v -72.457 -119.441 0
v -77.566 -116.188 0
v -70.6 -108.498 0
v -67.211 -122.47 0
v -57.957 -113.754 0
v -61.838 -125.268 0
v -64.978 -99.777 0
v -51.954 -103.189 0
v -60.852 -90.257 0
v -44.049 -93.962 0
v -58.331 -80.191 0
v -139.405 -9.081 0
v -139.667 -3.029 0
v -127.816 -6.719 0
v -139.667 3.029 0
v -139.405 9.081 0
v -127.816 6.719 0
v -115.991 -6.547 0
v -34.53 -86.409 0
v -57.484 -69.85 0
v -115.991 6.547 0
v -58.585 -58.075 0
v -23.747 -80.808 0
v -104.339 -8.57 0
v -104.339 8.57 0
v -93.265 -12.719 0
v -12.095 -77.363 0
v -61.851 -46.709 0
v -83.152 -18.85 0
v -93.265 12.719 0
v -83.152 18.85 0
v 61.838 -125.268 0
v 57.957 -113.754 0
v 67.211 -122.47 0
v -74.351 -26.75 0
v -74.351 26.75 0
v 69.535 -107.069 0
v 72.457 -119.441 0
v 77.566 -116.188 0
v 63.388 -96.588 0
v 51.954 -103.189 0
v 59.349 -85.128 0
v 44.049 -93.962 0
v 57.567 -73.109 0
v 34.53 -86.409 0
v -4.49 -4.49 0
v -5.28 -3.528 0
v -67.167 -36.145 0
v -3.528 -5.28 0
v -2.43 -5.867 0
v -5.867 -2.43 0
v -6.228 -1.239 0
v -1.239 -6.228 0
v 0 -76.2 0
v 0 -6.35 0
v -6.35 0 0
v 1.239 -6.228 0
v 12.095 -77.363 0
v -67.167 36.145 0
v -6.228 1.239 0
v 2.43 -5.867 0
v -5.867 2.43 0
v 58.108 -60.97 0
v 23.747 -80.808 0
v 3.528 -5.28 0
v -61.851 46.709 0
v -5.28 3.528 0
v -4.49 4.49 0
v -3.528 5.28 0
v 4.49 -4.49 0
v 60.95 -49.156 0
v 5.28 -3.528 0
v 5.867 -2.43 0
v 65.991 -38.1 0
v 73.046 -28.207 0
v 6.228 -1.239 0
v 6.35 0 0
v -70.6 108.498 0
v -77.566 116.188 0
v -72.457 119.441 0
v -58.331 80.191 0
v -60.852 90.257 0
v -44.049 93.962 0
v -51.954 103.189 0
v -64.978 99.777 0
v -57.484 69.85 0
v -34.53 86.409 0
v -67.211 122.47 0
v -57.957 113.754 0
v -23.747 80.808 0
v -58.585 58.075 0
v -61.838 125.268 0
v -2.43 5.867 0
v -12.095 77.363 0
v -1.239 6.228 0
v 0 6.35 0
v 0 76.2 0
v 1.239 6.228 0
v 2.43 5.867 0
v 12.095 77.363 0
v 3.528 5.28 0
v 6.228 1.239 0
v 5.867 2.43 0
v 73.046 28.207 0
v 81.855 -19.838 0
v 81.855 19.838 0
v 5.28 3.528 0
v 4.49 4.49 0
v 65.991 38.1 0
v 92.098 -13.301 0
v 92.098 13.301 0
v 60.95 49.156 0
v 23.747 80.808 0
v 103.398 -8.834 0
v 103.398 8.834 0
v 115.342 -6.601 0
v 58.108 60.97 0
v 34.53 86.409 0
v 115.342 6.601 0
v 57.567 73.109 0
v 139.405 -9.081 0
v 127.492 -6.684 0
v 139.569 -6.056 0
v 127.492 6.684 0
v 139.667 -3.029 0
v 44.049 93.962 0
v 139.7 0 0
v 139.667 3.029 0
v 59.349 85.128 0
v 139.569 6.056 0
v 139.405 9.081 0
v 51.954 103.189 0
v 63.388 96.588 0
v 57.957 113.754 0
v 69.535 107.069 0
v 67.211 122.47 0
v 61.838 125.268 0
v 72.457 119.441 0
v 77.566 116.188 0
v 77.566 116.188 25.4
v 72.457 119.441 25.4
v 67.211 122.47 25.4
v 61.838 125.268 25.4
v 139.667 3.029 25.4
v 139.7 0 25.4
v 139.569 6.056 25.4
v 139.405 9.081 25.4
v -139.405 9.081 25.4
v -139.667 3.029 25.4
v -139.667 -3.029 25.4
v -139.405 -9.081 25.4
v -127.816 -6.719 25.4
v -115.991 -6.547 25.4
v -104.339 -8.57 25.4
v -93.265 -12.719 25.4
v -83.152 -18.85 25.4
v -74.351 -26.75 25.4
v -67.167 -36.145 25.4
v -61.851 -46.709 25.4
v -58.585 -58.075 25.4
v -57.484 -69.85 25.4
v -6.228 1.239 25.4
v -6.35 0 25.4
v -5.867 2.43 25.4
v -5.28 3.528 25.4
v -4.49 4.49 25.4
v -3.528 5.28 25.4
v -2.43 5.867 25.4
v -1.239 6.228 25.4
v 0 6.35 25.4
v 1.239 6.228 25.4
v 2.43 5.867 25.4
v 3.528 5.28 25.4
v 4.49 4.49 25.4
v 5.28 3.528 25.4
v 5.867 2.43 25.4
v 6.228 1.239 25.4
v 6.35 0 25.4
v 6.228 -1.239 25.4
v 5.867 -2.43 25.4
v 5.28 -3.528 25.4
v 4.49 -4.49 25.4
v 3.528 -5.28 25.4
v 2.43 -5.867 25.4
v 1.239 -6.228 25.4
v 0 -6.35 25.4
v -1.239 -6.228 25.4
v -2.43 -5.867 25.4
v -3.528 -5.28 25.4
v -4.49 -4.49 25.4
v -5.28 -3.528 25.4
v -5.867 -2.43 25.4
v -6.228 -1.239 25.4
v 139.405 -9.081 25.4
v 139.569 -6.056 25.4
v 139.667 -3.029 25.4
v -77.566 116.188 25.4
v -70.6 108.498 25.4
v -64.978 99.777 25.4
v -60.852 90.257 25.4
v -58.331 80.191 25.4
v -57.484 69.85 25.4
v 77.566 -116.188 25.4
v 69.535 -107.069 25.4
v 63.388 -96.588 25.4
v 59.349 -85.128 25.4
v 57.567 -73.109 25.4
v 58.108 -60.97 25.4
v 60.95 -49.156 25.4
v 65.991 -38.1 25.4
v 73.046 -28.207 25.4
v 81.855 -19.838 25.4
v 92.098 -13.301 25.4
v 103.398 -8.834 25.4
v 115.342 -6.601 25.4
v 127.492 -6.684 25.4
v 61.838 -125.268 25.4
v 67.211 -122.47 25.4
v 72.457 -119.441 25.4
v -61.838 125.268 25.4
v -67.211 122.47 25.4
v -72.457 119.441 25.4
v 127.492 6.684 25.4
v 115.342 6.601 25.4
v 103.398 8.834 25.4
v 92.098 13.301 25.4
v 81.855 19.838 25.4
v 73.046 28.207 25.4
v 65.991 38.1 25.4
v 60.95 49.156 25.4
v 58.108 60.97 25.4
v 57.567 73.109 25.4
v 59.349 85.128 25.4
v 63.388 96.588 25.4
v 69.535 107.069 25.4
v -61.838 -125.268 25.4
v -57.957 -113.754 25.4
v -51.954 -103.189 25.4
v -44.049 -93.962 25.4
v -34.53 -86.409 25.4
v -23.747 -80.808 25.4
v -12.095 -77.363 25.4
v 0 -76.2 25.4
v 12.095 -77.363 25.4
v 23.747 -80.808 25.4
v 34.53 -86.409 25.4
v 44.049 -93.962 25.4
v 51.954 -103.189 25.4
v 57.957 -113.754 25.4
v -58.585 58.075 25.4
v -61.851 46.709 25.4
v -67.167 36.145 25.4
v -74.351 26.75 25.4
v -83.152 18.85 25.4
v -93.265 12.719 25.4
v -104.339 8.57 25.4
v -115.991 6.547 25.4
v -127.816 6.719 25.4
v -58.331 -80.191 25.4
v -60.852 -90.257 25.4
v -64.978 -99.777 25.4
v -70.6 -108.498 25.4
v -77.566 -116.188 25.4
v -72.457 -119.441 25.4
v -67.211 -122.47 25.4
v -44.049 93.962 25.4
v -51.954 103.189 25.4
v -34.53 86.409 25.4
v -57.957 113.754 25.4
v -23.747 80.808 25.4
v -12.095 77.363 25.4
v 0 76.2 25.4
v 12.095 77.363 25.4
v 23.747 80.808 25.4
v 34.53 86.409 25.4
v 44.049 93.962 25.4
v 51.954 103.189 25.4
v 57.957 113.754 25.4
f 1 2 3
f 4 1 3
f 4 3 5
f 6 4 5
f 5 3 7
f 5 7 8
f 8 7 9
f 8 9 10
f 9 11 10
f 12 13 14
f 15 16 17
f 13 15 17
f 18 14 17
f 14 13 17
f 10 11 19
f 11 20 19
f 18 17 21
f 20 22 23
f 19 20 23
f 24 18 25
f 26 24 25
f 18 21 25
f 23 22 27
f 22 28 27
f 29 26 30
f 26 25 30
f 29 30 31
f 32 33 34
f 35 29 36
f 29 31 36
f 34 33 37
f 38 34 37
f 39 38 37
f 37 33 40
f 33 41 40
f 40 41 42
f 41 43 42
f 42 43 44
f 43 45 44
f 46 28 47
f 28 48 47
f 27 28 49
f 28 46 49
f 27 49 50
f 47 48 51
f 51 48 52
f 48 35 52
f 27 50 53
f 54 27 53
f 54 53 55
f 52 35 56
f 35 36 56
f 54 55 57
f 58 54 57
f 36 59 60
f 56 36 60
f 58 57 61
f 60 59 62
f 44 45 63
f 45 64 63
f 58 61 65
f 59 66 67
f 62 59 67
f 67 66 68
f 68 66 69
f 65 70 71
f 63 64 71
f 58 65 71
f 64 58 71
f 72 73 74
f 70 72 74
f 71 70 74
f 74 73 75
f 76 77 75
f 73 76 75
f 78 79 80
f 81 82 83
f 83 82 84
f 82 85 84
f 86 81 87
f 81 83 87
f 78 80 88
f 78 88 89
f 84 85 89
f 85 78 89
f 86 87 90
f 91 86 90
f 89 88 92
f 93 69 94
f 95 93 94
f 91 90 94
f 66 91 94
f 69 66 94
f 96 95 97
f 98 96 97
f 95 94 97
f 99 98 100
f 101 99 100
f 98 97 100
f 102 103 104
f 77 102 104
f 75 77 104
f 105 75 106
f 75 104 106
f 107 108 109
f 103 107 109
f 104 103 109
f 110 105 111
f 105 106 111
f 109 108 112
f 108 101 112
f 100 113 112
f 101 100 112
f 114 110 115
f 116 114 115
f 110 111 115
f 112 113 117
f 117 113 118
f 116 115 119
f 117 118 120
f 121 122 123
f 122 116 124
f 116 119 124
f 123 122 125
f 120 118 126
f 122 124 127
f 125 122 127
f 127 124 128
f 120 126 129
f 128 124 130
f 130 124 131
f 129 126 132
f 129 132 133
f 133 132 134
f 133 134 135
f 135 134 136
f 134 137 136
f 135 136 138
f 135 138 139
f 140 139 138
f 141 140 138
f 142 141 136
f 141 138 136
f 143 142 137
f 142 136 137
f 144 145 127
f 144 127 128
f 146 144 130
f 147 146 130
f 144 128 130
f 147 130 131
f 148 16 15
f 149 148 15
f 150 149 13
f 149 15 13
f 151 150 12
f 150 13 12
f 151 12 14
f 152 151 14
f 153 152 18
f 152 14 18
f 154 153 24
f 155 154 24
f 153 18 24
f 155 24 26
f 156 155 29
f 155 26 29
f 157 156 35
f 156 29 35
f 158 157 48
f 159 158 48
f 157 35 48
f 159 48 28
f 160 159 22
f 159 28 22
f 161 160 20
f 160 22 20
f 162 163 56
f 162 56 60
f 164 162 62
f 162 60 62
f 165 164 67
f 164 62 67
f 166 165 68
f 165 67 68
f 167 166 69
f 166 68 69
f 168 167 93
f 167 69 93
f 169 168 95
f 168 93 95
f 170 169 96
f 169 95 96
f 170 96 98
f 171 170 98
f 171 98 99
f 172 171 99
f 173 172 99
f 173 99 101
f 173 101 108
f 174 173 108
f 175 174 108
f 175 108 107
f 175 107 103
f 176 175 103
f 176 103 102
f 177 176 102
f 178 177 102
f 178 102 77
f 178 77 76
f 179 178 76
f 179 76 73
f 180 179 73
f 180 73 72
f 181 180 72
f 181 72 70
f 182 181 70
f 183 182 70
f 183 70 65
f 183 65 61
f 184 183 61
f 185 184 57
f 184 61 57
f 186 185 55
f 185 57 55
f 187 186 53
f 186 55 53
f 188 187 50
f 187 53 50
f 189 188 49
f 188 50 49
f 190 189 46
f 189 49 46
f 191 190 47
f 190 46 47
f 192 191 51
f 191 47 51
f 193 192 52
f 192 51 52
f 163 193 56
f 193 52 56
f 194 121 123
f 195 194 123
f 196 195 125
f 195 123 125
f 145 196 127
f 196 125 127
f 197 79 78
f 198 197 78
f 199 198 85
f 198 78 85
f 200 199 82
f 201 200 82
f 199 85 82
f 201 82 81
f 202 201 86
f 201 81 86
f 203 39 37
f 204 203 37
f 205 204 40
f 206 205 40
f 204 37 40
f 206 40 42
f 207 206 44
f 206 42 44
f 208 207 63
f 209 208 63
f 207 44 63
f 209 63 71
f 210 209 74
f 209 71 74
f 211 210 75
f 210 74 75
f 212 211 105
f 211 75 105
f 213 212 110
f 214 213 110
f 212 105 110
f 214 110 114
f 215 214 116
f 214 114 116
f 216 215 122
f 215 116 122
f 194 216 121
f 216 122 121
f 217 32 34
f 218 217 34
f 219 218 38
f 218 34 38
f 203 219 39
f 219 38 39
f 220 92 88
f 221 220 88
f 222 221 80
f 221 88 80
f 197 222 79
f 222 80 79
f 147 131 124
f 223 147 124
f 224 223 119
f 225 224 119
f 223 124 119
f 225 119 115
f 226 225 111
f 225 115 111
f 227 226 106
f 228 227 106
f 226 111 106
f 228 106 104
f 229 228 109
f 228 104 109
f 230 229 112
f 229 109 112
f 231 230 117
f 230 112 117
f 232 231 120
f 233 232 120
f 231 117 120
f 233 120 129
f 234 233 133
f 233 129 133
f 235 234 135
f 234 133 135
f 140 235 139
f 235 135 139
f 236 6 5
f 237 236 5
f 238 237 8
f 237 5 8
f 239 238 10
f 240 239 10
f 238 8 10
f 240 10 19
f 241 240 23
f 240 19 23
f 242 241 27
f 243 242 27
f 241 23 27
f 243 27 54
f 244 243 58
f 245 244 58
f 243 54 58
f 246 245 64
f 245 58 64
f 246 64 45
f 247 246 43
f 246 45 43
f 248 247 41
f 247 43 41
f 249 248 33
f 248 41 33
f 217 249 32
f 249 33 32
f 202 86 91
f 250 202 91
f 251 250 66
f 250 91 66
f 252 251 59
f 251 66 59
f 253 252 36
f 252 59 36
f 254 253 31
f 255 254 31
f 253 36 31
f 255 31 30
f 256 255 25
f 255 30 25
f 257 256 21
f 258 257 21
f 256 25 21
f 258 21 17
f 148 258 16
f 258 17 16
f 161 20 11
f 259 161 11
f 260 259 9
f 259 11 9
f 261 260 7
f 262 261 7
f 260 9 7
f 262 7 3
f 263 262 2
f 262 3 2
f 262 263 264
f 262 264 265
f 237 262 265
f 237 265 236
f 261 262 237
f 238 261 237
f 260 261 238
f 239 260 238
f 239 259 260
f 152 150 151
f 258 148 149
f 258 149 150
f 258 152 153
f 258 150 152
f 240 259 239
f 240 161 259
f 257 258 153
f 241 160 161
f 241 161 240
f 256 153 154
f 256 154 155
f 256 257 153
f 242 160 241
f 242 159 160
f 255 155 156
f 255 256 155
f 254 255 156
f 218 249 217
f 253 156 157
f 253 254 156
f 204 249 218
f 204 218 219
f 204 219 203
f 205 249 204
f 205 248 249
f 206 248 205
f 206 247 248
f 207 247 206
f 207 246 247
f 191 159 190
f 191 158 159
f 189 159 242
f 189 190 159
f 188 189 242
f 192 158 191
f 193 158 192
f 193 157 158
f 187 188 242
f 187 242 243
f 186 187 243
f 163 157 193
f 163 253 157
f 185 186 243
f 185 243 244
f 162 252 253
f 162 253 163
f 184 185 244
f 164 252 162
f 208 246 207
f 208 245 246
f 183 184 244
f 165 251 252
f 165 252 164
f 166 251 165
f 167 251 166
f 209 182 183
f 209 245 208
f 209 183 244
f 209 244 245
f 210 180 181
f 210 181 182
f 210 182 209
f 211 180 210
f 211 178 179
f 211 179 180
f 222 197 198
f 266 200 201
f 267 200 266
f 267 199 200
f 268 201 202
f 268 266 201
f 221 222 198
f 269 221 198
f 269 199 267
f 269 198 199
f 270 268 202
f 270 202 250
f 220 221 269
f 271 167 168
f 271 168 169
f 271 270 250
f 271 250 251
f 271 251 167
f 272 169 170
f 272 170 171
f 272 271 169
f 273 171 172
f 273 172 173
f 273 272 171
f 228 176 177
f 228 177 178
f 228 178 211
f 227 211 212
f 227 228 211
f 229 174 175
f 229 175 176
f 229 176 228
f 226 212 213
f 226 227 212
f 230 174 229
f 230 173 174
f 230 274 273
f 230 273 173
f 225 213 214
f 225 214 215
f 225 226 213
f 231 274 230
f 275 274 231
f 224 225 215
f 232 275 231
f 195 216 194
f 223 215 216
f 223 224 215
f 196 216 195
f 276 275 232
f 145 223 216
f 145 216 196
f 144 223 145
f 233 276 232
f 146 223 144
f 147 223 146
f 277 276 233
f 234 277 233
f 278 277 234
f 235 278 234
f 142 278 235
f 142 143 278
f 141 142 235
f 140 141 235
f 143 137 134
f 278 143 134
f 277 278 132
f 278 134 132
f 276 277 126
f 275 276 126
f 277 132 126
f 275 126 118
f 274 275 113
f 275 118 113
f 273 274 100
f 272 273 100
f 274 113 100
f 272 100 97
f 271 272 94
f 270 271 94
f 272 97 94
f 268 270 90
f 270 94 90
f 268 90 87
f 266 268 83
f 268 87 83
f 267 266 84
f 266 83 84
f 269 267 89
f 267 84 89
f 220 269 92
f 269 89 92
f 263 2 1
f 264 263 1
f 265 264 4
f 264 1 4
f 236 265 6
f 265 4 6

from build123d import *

# Parameters (mm, degrees)
F2_DEPTH = 25.4
F4_D     = 12.7
F4_DEPTH = 127


with BuildPart() as f2:
    # F0 (on Top) → F2 (new body)
    with BuildSketch(Plane.XY):
        with BuildLine():
            ThreePointArc((139.404567, -9.080571), (139.626122, -4.542688), (139.7, 0))
            ThreePointArc((139.7, 0), (139.626122, 4.542688), (139.404567, 9.080571))
            ThreePointArc((139.404567, 9.080571), (65.991136, 38.1), (77.566289, 116.187611))
            ThreePointArc((77.566289, 116.187611), (69.85, 120.983749), (61.838278, 125.268182))
            ThreePointArc((61.838278, 125.268182), (0, 76.2), (-61.838278, 125.268182))
            ThreePointArc((-61.838278, 125.268182), (-69.85, 120.983749), (-77.566289, 116.187611))
            ThreePointArc((-77.566289, 116.187611), (-62.720301, 95.101151), (-57.483749, 69.85))
            ThreePointArc((-57.483749, 69.85), (-83.151699, 18.850138), (-139.404567, 9.080571))
            ThreePointArc((-139.404567, 9.080571), (-139.7, 0), (-139.404567, -9.080571))
            ThreePointArc((-139.404567, -9.080571), (-83.151699, -18.850138), (-57.483749, -69.85))
            ThreePointArc((-57.483749, -69.85), (-62.720301, -95.101151), (-77.566289, -116.187611))
            ThreePointArc((-77.566289, -116.187611), (-69.85, -120.983749), (-61.838278, -125.268182))
            ThreePointArc((-61.838278, -125.268182), (0, -76.2), (61.838278, -125.268182))
            ThreePointArc((61.838278, -125.268182), (69.85, -120.983749), (77.566289, -116.187611))
            ThreePointArc((77.566289, -116.187611), (65.991136, -38.1), (139.404567, -9.080571))
        make_face()
    extrude(amount=F2_DEPTH)

    # F4
    with Locations(Plane.XY.offset(25.4)):
        with Locations((0, 0)):
            Hole(F4_D / 2, depth=F4_DEPTH)


solid = f2.part
